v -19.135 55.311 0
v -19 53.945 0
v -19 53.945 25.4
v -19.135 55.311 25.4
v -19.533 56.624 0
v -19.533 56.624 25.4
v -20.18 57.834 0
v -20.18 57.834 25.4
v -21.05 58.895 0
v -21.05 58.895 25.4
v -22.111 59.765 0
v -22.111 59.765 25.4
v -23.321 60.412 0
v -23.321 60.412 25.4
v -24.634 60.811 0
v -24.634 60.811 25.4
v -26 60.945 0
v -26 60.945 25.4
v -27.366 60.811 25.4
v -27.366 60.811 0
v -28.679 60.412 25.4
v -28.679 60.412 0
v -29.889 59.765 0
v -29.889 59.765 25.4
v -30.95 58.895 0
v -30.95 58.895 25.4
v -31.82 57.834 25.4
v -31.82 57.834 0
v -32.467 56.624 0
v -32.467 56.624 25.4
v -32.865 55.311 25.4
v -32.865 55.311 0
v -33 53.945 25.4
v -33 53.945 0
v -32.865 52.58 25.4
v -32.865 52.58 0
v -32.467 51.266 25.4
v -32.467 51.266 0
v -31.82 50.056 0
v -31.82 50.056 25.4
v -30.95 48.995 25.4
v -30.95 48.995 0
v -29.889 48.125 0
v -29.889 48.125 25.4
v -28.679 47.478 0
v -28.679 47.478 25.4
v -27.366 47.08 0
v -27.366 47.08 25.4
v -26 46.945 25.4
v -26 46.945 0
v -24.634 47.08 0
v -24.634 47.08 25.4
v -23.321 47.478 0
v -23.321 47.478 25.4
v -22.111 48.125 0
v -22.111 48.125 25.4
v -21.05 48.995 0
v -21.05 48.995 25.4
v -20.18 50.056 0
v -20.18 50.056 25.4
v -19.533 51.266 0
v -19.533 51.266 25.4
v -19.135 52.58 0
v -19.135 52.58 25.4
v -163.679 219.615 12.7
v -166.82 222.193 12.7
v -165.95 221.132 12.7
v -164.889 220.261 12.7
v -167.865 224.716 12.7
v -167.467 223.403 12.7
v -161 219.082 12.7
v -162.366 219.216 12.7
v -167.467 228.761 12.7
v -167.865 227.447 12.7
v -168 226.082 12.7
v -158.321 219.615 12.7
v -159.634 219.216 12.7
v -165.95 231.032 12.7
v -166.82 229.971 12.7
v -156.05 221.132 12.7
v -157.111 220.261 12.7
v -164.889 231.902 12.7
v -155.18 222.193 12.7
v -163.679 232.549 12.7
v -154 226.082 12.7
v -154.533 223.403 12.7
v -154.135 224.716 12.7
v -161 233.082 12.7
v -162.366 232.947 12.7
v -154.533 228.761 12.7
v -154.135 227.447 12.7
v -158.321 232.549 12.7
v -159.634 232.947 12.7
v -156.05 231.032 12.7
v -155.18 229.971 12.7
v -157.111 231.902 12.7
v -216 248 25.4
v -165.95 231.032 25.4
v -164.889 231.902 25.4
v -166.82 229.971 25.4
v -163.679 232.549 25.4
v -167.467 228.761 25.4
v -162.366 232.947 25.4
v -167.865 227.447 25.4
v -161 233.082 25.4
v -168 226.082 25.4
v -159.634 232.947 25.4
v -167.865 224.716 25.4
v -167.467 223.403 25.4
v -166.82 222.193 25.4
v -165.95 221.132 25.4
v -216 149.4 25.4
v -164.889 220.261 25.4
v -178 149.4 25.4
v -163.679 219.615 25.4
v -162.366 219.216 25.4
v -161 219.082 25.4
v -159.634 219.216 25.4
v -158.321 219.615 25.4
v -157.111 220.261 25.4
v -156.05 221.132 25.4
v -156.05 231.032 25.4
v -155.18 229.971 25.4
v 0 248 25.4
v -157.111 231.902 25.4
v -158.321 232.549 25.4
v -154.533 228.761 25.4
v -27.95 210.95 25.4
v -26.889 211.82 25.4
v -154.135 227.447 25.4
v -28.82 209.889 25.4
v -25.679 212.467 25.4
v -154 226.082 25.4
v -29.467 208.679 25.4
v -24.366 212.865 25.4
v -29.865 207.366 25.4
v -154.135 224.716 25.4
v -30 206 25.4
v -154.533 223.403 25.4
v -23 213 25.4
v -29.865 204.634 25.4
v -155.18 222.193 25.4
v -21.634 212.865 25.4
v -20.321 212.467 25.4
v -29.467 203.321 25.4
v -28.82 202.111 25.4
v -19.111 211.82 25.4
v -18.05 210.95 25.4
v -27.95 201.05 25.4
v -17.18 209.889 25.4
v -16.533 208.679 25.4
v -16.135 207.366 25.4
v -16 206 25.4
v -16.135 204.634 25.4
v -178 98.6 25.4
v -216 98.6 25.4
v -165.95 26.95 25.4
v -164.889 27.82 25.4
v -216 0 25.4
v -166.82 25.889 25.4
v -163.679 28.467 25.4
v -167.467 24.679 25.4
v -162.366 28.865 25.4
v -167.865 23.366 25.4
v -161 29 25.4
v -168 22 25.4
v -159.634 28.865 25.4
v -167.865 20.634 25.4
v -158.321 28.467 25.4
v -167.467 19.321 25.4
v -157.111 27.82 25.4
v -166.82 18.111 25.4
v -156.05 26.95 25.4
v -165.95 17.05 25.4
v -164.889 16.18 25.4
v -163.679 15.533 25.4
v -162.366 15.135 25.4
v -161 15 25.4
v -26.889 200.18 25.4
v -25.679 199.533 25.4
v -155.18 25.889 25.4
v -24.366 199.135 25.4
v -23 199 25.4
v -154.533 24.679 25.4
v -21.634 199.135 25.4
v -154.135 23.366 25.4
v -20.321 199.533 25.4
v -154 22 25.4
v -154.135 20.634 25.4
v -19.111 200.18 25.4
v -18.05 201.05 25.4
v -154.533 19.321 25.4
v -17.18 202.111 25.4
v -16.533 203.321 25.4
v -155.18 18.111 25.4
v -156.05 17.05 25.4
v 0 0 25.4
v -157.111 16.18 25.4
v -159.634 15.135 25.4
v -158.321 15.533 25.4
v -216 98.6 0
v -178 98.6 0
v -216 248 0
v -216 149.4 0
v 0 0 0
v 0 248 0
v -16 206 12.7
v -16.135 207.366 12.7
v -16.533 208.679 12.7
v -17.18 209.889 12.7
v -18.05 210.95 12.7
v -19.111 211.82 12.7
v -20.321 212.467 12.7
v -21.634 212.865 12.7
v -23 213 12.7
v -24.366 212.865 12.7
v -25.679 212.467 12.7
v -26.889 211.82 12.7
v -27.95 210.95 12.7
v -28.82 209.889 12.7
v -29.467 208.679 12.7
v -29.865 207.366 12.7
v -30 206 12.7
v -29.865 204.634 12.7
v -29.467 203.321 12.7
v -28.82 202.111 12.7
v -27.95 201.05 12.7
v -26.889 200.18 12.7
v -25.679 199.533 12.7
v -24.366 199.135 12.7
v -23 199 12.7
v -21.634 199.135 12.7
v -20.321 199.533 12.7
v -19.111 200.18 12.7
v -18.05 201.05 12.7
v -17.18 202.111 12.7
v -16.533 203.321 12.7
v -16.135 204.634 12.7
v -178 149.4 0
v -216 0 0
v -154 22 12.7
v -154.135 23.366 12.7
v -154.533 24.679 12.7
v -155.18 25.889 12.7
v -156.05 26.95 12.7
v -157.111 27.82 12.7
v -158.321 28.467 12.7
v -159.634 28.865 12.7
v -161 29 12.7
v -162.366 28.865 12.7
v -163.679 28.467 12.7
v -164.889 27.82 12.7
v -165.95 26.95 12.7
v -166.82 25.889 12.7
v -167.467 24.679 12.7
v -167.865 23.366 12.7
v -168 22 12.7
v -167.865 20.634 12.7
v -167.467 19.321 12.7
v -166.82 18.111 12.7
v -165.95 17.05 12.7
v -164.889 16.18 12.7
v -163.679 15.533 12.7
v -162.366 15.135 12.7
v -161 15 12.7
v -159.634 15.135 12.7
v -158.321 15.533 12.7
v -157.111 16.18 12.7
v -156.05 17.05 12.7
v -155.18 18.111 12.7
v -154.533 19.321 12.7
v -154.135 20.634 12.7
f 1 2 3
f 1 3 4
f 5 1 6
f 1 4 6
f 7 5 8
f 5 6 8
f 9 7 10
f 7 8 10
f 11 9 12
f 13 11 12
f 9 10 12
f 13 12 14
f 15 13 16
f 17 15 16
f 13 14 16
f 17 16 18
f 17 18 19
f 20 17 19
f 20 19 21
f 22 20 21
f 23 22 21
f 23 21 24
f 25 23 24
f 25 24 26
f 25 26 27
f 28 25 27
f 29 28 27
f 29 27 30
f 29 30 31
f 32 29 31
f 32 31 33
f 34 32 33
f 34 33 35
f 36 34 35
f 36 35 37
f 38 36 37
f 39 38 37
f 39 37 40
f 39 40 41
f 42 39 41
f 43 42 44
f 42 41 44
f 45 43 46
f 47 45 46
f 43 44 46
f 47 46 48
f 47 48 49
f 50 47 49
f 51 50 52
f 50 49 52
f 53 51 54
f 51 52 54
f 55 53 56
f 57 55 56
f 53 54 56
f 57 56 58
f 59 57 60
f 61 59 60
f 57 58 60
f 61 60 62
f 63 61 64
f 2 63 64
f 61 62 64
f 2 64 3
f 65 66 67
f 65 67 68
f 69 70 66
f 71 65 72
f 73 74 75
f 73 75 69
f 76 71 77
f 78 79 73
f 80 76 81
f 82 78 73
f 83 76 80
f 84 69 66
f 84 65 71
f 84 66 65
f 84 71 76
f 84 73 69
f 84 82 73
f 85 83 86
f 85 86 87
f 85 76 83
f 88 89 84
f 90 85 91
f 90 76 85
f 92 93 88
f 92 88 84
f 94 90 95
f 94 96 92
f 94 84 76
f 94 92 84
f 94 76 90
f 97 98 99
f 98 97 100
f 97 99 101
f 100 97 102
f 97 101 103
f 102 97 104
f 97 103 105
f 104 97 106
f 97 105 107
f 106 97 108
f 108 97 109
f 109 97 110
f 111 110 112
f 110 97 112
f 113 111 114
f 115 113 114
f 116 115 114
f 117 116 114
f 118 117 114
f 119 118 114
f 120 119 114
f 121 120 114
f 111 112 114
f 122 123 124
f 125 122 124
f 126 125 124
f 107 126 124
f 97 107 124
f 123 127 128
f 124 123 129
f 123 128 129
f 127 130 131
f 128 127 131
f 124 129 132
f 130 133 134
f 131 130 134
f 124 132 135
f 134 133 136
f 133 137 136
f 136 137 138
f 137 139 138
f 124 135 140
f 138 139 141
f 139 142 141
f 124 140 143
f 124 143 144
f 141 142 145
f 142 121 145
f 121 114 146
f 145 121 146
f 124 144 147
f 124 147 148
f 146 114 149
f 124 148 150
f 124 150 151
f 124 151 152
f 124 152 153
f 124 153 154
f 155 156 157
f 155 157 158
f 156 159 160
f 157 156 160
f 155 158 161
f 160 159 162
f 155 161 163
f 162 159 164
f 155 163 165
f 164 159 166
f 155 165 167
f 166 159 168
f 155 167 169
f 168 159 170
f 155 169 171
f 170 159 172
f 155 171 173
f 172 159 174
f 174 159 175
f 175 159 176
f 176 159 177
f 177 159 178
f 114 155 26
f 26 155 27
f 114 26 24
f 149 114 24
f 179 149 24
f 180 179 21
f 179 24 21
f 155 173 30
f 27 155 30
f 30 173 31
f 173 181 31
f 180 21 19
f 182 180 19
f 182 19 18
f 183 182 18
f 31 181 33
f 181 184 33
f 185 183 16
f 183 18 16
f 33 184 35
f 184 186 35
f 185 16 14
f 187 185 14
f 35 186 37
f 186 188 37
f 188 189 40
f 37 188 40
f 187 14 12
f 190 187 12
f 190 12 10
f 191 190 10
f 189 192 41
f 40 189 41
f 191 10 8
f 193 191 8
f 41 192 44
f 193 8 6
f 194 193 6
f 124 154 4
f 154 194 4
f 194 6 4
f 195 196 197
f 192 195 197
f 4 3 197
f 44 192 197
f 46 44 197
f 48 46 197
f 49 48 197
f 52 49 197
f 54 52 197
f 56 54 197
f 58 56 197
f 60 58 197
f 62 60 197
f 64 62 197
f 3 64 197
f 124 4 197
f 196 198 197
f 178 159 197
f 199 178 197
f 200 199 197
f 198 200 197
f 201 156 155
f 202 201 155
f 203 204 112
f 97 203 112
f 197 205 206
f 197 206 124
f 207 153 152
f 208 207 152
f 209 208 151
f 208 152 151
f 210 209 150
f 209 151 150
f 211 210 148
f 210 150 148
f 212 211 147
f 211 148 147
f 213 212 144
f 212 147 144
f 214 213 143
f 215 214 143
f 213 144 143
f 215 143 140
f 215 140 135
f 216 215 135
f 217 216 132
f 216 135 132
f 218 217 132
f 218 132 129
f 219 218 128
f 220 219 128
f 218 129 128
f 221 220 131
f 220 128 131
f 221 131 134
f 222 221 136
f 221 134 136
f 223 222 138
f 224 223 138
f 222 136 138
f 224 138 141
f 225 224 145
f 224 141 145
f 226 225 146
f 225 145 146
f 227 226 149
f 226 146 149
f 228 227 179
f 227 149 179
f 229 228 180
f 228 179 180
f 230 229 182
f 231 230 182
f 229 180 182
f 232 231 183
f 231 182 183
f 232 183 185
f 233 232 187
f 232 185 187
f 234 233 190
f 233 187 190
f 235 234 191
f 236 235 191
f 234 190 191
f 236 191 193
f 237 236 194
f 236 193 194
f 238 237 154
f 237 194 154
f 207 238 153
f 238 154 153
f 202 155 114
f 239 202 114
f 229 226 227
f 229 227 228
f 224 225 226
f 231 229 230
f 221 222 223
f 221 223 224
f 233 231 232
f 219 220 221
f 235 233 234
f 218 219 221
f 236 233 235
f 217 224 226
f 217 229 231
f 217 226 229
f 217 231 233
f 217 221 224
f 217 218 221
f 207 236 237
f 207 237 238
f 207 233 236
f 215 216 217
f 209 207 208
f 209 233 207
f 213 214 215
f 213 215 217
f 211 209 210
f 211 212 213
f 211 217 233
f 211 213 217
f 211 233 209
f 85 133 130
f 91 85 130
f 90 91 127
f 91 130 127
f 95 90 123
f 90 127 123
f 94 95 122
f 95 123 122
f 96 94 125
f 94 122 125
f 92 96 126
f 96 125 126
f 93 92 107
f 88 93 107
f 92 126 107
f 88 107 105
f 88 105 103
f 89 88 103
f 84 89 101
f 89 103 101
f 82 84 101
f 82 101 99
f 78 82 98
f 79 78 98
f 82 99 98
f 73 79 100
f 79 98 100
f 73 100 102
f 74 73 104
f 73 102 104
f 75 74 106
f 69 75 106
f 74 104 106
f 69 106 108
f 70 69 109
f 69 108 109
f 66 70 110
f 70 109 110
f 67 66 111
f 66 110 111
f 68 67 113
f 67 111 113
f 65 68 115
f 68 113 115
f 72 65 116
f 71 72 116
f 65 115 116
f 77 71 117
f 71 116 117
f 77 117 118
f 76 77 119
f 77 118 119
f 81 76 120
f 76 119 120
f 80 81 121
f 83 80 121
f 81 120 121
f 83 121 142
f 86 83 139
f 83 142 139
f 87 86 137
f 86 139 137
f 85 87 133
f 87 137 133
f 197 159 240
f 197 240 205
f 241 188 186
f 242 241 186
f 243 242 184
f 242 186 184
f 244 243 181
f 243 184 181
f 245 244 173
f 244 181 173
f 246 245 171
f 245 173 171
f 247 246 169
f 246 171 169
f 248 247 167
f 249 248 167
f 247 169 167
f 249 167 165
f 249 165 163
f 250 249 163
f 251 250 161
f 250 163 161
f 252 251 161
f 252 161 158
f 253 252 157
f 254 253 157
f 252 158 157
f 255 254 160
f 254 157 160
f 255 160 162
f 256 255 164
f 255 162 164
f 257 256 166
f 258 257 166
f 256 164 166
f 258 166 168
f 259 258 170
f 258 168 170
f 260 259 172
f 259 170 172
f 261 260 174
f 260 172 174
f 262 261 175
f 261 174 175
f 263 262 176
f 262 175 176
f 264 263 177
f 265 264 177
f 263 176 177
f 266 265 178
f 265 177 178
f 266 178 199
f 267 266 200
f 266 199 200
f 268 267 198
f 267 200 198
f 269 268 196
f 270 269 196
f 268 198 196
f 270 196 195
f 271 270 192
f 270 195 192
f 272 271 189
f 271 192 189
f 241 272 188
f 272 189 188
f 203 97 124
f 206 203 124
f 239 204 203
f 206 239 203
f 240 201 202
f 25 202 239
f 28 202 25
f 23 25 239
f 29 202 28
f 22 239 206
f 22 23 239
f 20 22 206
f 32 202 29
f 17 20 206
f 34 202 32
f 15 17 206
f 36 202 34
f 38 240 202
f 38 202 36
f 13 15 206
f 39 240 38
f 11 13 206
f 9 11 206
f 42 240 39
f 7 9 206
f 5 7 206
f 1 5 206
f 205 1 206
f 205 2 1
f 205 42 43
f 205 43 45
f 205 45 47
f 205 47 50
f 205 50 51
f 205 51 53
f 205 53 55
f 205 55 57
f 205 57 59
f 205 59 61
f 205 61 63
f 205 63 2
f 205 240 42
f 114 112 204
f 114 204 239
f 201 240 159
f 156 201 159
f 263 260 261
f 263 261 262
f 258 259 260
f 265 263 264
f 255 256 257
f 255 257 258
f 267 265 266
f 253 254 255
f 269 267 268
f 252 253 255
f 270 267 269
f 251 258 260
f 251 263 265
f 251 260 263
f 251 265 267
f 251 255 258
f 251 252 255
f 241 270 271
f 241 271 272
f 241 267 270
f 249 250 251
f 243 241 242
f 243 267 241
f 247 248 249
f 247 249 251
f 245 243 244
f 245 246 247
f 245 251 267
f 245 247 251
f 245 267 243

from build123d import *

# Parameters (mm, degrees)
F0_W     = 216
F0_H     = 25.4
F1_DEPTH = 248
F2_R     = 7
F3_DEPTH = 12.7
F4_W     = 38
F4_H     = 50.8
F4_R     = 7
F5_DEPTH = 25.4


with BuildPart() as f1:
    # F0 (on Front) → F1 (new body)
    with BuildSketch(Plane.XZ):
        with Locations((-108, 12.7)):
            Rectangle(F0_W, F0_H)
    extrude(amount=-F1_DEPTH)

    # F2 (on face) → F3 (cut)
    with BuildSketch(Plane.XY.offset(25.4)):
        with Locations((-161, 226.081771)):
            Circle(F2_R)
        with Locations((-161, 22)):
            Circle(F2_R)
        with Locations((-23, 206)):
            Circle(F2_R)
        with Locations((-26, 53.945143)):
            Circle(F2_R)
    extrude(amount=-F3_DEPTH, mode=Mode.SUBTRACT)

    # F4 (on face) → F5 (cut, through all)
    with BuildSketch(Plane.XY.offset(25.4)):
        with Locations((-197, 124)):
            Rectangle(F4_W, F4_H)
        with Locations((-26, 53.945143)):
            Circle(F4_R)
    extrude(amount=-F5_DEPTH, mode=Mode.SUBTRACT)


solid = f1.part
